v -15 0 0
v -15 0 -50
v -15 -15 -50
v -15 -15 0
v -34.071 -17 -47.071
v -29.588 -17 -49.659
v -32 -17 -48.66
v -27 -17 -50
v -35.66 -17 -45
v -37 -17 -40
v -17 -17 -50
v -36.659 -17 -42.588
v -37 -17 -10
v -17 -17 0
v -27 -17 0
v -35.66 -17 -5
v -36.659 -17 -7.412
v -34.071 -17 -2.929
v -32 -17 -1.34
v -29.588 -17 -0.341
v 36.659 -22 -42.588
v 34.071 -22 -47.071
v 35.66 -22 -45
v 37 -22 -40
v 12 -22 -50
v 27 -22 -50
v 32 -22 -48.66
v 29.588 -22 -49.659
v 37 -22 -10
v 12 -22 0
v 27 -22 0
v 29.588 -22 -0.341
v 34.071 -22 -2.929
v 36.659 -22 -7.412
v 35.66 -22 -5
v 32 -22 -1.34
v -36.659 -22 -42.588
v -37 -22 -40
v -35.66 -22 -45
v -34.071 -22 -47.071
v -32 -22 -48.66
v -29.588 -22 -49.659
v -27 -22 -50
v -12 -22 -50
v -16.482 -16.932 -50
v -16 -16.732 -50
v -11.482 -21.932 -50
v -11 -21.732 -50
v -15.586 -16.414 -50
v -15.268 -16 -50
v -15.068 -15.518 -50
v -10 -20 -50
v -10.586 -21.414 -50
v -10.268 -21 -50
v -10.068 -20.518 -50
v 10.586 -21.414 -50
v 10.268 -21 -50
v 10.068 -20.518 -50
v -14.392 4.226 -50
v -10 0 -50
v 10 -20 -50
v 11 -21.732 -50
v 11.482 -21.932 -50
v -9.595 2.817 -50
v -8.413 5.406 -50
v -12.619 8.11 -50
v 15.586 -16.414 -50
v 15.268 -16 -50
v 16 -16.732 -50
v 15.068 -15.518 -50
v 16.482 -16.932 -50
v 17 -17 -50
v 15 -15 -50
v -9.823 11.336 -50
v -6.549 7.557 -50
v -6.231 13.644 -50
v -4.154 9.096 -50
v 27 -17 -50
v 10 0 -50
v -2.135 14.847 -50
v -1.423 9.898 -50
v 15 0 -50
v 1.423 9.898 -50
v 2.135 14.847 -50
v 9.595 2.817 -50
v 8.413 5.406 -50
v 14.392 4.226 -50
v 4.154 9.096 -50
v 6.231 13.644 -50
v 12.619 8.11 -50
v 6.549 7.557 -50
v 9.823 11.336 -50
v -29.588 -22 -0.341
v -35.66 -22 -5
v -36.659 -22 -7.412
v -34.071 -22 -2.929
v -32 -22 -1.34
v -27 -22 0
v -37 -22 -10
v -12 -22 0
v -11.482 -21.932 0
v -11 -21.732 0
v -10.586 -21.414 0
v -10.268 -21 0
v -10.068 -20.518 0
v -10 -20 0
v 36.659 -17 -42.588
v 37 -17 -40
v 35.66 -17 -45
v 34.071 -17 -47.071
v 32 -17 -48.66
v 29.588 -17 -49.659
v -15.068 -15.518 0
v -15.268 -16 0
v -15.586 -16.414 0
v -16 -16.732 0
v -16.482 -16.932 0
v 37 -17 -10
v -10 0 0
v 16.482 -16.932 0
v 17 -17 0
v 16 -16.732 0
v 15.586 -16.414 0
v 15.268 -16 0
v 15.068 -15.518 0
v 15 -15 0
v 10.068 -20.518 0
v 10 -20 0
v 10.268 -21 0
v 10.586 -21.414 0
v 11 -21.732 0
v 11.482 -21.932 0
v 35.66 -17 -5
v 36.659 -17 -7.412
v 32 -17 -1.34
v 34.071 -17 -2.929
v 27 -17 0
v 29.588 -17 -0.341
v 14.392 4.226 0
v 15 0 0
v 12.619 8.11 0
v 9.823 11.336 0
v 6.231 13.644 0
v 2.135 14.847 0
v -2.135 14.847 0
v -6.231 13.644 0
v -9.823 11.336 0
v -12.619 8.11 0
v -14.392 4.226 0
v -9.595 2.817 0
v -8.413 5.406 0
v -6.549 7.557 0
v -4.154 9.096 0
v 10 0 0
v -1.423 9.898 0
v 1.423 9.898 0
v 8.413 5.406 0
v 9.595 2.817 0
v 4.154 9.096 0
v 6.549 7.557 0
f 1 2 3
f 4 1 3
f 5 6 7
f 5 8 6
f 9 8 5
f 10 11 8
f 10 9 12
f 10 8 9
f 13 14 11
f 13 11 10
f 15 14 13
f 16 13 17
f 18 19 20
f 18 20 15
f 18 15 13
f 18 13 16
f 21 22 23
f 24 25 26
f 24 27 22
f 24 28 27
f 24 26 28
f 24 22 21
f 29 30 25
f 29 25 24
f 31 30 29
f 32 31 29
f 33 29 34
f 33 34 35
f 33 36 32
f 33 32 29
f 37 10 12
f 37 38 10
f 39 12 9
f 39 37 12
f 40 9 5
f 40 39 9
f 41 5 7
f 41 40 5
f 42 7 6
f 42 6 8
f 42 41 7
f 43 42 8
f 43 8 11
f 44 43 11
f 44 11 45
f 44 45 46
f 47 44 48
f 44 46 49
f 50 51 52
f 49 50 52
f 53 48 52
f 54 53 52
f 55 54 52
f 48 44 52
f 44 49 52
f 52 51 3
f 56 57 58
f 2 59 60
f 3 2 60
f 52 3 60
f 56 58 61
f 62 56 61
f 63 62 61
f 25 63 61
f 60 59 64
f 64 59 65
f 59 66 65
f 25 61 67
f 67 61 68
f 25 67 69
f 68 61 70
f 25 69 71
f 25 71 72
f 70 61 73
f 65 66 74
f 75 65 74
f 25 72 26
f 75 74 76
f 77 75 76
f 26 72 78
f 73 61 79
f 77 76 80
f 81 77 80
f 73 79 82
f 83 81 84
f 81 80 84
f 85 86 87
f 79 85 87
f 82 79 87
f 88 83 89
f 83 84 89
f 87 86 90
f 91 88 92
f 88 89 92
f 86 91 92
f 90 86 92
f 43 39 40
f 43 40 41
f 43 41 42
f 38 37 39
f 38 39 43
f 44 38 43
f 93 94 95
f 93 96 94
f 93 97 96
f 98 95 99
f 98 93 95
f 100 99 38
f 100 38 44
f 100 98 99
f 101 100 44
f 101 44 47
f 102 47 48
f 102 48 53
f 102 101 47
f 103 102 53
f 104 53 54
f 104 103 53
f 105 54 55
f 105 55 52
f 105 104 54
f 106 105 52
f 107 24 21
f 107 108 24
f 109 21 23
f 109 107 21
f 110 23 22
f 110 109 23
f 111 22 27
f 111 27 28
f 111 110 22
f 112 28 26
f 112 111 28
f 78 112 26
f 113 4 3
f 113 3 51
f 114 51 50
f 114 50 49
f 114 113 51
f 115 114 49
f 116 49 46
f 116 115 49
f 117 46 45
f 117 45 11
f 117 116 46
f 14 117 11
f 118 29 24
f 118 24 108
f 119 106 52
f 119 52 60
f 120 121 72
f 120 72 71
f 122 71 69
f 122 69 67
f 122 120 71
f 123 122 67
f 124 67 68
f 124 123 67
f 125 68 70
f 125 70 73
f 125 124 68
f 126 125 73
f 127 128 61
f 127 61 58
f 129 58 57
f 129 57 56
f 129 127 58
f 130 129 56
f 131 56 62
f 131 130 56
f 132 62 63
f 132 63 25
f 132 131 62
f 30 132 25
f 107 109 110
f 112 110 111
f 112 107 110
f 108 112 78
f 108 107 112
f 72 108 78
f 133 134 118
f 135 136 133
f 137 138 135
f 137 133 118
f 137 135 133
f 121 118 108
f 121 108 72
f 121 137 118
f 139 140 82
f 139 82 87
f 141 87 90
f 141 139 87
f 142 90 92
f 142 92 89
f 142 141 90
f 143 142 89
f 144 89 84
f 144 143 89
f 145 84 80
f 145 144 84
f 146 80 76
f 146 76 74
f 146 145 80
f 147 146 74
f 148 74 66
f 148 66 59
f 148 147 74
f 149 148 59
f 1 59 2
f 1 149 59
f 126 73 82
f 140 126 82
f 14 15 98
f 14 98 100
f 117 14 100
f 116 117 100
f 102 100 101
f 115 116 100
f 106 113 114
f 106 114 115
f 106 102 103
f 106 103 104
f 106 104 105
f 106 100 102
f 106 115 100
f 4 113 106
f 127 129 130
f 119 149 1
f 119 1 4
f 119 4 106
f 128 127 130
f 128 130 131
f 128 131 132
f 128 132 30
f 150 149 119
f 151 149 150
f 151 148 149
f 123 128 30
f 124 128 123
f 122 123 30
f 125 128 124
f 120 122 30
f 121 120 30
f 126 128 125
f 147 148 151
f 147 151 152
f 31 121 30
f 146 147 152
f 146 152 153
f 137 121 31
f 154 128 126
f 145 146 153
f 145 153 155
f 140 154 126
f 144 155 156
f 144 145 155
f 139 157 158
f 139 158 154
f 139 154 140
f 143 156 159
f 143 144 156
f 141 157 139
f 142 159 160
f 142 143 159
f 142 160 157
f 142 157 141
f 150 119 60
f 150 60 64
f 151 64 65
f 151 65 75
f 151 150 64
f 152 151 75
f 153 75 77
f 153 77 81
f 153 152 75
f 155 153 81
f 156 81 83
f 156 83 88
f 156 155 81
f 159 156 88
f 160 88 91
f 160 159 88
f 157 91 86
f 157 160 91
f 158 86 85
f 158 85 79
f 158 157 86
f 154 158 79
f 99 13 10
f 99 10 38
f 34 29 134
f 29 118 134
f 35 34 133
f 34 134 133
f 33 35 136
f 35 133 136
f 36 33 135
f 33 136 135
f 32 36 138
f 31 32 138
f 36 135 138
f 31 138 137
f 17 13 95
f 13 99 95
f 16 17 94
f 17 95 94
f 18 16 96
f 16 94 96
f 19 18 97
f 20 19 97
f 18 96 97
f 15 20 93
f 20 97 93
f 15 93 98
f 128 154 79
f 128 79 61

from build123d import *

# Parameters (mm, degrees)
BOSS_EXTRUDE4_DEPTH = 50
FILLET1_R           = 10


with BuildPart() as part:
    # Sketch6 → Boss-Extrude4 (new body)
    with BuildSketch(Plane.XY):
        with BuildLine():
            Line((10, 0), (10, -20))
            ThreePointArc((10, -20), (10.585786438, -21.414213562), (12, -22))
            Line((12, -22), (37, -22))
            Line((37, -22), (37, -17))
            Line((37, -17), (17, -17))
            ThreePointArc((17, -17), (15.585786438, -16.414213562), (15, -15))
            Line((15, -15), (15, 0))
            ThreePointArc((15, 0), (0, 15), (-15, 0))
            Line((-15, 0), (-15, -15))
            ThreePointArc((-15, -15), (-15.585786438, -16.414213562), (-17, -17))
            Line((-17, -17), (-37, -17))
            Line((-37, -17), (-37, -22))
            Line((-37, -22), (-12, -22))
            ThreePointArc((-12, -22), (-10.585786438, -21.414213562), (-10, -20))
            Line((-10, -20), (-10, 0))
            ThreePointArc((-10, 0), (0, 10), (10, 0))
        make_face()
    extrude(amount=-BOSS_EXTRUDE4_DEPTH)

    # Fillet1
    fillet1_edges = [part.edges().sort_by_distance(p)[0] for p in [
        (37, -19.5, 0),
        (-37, -19.5, 0),
        (-37, -19.5, -50),
        (37, -19.5, -50),
    ]]
    fillet(fillet1_edges, radius=FILLET1_R)


solid = part.part
